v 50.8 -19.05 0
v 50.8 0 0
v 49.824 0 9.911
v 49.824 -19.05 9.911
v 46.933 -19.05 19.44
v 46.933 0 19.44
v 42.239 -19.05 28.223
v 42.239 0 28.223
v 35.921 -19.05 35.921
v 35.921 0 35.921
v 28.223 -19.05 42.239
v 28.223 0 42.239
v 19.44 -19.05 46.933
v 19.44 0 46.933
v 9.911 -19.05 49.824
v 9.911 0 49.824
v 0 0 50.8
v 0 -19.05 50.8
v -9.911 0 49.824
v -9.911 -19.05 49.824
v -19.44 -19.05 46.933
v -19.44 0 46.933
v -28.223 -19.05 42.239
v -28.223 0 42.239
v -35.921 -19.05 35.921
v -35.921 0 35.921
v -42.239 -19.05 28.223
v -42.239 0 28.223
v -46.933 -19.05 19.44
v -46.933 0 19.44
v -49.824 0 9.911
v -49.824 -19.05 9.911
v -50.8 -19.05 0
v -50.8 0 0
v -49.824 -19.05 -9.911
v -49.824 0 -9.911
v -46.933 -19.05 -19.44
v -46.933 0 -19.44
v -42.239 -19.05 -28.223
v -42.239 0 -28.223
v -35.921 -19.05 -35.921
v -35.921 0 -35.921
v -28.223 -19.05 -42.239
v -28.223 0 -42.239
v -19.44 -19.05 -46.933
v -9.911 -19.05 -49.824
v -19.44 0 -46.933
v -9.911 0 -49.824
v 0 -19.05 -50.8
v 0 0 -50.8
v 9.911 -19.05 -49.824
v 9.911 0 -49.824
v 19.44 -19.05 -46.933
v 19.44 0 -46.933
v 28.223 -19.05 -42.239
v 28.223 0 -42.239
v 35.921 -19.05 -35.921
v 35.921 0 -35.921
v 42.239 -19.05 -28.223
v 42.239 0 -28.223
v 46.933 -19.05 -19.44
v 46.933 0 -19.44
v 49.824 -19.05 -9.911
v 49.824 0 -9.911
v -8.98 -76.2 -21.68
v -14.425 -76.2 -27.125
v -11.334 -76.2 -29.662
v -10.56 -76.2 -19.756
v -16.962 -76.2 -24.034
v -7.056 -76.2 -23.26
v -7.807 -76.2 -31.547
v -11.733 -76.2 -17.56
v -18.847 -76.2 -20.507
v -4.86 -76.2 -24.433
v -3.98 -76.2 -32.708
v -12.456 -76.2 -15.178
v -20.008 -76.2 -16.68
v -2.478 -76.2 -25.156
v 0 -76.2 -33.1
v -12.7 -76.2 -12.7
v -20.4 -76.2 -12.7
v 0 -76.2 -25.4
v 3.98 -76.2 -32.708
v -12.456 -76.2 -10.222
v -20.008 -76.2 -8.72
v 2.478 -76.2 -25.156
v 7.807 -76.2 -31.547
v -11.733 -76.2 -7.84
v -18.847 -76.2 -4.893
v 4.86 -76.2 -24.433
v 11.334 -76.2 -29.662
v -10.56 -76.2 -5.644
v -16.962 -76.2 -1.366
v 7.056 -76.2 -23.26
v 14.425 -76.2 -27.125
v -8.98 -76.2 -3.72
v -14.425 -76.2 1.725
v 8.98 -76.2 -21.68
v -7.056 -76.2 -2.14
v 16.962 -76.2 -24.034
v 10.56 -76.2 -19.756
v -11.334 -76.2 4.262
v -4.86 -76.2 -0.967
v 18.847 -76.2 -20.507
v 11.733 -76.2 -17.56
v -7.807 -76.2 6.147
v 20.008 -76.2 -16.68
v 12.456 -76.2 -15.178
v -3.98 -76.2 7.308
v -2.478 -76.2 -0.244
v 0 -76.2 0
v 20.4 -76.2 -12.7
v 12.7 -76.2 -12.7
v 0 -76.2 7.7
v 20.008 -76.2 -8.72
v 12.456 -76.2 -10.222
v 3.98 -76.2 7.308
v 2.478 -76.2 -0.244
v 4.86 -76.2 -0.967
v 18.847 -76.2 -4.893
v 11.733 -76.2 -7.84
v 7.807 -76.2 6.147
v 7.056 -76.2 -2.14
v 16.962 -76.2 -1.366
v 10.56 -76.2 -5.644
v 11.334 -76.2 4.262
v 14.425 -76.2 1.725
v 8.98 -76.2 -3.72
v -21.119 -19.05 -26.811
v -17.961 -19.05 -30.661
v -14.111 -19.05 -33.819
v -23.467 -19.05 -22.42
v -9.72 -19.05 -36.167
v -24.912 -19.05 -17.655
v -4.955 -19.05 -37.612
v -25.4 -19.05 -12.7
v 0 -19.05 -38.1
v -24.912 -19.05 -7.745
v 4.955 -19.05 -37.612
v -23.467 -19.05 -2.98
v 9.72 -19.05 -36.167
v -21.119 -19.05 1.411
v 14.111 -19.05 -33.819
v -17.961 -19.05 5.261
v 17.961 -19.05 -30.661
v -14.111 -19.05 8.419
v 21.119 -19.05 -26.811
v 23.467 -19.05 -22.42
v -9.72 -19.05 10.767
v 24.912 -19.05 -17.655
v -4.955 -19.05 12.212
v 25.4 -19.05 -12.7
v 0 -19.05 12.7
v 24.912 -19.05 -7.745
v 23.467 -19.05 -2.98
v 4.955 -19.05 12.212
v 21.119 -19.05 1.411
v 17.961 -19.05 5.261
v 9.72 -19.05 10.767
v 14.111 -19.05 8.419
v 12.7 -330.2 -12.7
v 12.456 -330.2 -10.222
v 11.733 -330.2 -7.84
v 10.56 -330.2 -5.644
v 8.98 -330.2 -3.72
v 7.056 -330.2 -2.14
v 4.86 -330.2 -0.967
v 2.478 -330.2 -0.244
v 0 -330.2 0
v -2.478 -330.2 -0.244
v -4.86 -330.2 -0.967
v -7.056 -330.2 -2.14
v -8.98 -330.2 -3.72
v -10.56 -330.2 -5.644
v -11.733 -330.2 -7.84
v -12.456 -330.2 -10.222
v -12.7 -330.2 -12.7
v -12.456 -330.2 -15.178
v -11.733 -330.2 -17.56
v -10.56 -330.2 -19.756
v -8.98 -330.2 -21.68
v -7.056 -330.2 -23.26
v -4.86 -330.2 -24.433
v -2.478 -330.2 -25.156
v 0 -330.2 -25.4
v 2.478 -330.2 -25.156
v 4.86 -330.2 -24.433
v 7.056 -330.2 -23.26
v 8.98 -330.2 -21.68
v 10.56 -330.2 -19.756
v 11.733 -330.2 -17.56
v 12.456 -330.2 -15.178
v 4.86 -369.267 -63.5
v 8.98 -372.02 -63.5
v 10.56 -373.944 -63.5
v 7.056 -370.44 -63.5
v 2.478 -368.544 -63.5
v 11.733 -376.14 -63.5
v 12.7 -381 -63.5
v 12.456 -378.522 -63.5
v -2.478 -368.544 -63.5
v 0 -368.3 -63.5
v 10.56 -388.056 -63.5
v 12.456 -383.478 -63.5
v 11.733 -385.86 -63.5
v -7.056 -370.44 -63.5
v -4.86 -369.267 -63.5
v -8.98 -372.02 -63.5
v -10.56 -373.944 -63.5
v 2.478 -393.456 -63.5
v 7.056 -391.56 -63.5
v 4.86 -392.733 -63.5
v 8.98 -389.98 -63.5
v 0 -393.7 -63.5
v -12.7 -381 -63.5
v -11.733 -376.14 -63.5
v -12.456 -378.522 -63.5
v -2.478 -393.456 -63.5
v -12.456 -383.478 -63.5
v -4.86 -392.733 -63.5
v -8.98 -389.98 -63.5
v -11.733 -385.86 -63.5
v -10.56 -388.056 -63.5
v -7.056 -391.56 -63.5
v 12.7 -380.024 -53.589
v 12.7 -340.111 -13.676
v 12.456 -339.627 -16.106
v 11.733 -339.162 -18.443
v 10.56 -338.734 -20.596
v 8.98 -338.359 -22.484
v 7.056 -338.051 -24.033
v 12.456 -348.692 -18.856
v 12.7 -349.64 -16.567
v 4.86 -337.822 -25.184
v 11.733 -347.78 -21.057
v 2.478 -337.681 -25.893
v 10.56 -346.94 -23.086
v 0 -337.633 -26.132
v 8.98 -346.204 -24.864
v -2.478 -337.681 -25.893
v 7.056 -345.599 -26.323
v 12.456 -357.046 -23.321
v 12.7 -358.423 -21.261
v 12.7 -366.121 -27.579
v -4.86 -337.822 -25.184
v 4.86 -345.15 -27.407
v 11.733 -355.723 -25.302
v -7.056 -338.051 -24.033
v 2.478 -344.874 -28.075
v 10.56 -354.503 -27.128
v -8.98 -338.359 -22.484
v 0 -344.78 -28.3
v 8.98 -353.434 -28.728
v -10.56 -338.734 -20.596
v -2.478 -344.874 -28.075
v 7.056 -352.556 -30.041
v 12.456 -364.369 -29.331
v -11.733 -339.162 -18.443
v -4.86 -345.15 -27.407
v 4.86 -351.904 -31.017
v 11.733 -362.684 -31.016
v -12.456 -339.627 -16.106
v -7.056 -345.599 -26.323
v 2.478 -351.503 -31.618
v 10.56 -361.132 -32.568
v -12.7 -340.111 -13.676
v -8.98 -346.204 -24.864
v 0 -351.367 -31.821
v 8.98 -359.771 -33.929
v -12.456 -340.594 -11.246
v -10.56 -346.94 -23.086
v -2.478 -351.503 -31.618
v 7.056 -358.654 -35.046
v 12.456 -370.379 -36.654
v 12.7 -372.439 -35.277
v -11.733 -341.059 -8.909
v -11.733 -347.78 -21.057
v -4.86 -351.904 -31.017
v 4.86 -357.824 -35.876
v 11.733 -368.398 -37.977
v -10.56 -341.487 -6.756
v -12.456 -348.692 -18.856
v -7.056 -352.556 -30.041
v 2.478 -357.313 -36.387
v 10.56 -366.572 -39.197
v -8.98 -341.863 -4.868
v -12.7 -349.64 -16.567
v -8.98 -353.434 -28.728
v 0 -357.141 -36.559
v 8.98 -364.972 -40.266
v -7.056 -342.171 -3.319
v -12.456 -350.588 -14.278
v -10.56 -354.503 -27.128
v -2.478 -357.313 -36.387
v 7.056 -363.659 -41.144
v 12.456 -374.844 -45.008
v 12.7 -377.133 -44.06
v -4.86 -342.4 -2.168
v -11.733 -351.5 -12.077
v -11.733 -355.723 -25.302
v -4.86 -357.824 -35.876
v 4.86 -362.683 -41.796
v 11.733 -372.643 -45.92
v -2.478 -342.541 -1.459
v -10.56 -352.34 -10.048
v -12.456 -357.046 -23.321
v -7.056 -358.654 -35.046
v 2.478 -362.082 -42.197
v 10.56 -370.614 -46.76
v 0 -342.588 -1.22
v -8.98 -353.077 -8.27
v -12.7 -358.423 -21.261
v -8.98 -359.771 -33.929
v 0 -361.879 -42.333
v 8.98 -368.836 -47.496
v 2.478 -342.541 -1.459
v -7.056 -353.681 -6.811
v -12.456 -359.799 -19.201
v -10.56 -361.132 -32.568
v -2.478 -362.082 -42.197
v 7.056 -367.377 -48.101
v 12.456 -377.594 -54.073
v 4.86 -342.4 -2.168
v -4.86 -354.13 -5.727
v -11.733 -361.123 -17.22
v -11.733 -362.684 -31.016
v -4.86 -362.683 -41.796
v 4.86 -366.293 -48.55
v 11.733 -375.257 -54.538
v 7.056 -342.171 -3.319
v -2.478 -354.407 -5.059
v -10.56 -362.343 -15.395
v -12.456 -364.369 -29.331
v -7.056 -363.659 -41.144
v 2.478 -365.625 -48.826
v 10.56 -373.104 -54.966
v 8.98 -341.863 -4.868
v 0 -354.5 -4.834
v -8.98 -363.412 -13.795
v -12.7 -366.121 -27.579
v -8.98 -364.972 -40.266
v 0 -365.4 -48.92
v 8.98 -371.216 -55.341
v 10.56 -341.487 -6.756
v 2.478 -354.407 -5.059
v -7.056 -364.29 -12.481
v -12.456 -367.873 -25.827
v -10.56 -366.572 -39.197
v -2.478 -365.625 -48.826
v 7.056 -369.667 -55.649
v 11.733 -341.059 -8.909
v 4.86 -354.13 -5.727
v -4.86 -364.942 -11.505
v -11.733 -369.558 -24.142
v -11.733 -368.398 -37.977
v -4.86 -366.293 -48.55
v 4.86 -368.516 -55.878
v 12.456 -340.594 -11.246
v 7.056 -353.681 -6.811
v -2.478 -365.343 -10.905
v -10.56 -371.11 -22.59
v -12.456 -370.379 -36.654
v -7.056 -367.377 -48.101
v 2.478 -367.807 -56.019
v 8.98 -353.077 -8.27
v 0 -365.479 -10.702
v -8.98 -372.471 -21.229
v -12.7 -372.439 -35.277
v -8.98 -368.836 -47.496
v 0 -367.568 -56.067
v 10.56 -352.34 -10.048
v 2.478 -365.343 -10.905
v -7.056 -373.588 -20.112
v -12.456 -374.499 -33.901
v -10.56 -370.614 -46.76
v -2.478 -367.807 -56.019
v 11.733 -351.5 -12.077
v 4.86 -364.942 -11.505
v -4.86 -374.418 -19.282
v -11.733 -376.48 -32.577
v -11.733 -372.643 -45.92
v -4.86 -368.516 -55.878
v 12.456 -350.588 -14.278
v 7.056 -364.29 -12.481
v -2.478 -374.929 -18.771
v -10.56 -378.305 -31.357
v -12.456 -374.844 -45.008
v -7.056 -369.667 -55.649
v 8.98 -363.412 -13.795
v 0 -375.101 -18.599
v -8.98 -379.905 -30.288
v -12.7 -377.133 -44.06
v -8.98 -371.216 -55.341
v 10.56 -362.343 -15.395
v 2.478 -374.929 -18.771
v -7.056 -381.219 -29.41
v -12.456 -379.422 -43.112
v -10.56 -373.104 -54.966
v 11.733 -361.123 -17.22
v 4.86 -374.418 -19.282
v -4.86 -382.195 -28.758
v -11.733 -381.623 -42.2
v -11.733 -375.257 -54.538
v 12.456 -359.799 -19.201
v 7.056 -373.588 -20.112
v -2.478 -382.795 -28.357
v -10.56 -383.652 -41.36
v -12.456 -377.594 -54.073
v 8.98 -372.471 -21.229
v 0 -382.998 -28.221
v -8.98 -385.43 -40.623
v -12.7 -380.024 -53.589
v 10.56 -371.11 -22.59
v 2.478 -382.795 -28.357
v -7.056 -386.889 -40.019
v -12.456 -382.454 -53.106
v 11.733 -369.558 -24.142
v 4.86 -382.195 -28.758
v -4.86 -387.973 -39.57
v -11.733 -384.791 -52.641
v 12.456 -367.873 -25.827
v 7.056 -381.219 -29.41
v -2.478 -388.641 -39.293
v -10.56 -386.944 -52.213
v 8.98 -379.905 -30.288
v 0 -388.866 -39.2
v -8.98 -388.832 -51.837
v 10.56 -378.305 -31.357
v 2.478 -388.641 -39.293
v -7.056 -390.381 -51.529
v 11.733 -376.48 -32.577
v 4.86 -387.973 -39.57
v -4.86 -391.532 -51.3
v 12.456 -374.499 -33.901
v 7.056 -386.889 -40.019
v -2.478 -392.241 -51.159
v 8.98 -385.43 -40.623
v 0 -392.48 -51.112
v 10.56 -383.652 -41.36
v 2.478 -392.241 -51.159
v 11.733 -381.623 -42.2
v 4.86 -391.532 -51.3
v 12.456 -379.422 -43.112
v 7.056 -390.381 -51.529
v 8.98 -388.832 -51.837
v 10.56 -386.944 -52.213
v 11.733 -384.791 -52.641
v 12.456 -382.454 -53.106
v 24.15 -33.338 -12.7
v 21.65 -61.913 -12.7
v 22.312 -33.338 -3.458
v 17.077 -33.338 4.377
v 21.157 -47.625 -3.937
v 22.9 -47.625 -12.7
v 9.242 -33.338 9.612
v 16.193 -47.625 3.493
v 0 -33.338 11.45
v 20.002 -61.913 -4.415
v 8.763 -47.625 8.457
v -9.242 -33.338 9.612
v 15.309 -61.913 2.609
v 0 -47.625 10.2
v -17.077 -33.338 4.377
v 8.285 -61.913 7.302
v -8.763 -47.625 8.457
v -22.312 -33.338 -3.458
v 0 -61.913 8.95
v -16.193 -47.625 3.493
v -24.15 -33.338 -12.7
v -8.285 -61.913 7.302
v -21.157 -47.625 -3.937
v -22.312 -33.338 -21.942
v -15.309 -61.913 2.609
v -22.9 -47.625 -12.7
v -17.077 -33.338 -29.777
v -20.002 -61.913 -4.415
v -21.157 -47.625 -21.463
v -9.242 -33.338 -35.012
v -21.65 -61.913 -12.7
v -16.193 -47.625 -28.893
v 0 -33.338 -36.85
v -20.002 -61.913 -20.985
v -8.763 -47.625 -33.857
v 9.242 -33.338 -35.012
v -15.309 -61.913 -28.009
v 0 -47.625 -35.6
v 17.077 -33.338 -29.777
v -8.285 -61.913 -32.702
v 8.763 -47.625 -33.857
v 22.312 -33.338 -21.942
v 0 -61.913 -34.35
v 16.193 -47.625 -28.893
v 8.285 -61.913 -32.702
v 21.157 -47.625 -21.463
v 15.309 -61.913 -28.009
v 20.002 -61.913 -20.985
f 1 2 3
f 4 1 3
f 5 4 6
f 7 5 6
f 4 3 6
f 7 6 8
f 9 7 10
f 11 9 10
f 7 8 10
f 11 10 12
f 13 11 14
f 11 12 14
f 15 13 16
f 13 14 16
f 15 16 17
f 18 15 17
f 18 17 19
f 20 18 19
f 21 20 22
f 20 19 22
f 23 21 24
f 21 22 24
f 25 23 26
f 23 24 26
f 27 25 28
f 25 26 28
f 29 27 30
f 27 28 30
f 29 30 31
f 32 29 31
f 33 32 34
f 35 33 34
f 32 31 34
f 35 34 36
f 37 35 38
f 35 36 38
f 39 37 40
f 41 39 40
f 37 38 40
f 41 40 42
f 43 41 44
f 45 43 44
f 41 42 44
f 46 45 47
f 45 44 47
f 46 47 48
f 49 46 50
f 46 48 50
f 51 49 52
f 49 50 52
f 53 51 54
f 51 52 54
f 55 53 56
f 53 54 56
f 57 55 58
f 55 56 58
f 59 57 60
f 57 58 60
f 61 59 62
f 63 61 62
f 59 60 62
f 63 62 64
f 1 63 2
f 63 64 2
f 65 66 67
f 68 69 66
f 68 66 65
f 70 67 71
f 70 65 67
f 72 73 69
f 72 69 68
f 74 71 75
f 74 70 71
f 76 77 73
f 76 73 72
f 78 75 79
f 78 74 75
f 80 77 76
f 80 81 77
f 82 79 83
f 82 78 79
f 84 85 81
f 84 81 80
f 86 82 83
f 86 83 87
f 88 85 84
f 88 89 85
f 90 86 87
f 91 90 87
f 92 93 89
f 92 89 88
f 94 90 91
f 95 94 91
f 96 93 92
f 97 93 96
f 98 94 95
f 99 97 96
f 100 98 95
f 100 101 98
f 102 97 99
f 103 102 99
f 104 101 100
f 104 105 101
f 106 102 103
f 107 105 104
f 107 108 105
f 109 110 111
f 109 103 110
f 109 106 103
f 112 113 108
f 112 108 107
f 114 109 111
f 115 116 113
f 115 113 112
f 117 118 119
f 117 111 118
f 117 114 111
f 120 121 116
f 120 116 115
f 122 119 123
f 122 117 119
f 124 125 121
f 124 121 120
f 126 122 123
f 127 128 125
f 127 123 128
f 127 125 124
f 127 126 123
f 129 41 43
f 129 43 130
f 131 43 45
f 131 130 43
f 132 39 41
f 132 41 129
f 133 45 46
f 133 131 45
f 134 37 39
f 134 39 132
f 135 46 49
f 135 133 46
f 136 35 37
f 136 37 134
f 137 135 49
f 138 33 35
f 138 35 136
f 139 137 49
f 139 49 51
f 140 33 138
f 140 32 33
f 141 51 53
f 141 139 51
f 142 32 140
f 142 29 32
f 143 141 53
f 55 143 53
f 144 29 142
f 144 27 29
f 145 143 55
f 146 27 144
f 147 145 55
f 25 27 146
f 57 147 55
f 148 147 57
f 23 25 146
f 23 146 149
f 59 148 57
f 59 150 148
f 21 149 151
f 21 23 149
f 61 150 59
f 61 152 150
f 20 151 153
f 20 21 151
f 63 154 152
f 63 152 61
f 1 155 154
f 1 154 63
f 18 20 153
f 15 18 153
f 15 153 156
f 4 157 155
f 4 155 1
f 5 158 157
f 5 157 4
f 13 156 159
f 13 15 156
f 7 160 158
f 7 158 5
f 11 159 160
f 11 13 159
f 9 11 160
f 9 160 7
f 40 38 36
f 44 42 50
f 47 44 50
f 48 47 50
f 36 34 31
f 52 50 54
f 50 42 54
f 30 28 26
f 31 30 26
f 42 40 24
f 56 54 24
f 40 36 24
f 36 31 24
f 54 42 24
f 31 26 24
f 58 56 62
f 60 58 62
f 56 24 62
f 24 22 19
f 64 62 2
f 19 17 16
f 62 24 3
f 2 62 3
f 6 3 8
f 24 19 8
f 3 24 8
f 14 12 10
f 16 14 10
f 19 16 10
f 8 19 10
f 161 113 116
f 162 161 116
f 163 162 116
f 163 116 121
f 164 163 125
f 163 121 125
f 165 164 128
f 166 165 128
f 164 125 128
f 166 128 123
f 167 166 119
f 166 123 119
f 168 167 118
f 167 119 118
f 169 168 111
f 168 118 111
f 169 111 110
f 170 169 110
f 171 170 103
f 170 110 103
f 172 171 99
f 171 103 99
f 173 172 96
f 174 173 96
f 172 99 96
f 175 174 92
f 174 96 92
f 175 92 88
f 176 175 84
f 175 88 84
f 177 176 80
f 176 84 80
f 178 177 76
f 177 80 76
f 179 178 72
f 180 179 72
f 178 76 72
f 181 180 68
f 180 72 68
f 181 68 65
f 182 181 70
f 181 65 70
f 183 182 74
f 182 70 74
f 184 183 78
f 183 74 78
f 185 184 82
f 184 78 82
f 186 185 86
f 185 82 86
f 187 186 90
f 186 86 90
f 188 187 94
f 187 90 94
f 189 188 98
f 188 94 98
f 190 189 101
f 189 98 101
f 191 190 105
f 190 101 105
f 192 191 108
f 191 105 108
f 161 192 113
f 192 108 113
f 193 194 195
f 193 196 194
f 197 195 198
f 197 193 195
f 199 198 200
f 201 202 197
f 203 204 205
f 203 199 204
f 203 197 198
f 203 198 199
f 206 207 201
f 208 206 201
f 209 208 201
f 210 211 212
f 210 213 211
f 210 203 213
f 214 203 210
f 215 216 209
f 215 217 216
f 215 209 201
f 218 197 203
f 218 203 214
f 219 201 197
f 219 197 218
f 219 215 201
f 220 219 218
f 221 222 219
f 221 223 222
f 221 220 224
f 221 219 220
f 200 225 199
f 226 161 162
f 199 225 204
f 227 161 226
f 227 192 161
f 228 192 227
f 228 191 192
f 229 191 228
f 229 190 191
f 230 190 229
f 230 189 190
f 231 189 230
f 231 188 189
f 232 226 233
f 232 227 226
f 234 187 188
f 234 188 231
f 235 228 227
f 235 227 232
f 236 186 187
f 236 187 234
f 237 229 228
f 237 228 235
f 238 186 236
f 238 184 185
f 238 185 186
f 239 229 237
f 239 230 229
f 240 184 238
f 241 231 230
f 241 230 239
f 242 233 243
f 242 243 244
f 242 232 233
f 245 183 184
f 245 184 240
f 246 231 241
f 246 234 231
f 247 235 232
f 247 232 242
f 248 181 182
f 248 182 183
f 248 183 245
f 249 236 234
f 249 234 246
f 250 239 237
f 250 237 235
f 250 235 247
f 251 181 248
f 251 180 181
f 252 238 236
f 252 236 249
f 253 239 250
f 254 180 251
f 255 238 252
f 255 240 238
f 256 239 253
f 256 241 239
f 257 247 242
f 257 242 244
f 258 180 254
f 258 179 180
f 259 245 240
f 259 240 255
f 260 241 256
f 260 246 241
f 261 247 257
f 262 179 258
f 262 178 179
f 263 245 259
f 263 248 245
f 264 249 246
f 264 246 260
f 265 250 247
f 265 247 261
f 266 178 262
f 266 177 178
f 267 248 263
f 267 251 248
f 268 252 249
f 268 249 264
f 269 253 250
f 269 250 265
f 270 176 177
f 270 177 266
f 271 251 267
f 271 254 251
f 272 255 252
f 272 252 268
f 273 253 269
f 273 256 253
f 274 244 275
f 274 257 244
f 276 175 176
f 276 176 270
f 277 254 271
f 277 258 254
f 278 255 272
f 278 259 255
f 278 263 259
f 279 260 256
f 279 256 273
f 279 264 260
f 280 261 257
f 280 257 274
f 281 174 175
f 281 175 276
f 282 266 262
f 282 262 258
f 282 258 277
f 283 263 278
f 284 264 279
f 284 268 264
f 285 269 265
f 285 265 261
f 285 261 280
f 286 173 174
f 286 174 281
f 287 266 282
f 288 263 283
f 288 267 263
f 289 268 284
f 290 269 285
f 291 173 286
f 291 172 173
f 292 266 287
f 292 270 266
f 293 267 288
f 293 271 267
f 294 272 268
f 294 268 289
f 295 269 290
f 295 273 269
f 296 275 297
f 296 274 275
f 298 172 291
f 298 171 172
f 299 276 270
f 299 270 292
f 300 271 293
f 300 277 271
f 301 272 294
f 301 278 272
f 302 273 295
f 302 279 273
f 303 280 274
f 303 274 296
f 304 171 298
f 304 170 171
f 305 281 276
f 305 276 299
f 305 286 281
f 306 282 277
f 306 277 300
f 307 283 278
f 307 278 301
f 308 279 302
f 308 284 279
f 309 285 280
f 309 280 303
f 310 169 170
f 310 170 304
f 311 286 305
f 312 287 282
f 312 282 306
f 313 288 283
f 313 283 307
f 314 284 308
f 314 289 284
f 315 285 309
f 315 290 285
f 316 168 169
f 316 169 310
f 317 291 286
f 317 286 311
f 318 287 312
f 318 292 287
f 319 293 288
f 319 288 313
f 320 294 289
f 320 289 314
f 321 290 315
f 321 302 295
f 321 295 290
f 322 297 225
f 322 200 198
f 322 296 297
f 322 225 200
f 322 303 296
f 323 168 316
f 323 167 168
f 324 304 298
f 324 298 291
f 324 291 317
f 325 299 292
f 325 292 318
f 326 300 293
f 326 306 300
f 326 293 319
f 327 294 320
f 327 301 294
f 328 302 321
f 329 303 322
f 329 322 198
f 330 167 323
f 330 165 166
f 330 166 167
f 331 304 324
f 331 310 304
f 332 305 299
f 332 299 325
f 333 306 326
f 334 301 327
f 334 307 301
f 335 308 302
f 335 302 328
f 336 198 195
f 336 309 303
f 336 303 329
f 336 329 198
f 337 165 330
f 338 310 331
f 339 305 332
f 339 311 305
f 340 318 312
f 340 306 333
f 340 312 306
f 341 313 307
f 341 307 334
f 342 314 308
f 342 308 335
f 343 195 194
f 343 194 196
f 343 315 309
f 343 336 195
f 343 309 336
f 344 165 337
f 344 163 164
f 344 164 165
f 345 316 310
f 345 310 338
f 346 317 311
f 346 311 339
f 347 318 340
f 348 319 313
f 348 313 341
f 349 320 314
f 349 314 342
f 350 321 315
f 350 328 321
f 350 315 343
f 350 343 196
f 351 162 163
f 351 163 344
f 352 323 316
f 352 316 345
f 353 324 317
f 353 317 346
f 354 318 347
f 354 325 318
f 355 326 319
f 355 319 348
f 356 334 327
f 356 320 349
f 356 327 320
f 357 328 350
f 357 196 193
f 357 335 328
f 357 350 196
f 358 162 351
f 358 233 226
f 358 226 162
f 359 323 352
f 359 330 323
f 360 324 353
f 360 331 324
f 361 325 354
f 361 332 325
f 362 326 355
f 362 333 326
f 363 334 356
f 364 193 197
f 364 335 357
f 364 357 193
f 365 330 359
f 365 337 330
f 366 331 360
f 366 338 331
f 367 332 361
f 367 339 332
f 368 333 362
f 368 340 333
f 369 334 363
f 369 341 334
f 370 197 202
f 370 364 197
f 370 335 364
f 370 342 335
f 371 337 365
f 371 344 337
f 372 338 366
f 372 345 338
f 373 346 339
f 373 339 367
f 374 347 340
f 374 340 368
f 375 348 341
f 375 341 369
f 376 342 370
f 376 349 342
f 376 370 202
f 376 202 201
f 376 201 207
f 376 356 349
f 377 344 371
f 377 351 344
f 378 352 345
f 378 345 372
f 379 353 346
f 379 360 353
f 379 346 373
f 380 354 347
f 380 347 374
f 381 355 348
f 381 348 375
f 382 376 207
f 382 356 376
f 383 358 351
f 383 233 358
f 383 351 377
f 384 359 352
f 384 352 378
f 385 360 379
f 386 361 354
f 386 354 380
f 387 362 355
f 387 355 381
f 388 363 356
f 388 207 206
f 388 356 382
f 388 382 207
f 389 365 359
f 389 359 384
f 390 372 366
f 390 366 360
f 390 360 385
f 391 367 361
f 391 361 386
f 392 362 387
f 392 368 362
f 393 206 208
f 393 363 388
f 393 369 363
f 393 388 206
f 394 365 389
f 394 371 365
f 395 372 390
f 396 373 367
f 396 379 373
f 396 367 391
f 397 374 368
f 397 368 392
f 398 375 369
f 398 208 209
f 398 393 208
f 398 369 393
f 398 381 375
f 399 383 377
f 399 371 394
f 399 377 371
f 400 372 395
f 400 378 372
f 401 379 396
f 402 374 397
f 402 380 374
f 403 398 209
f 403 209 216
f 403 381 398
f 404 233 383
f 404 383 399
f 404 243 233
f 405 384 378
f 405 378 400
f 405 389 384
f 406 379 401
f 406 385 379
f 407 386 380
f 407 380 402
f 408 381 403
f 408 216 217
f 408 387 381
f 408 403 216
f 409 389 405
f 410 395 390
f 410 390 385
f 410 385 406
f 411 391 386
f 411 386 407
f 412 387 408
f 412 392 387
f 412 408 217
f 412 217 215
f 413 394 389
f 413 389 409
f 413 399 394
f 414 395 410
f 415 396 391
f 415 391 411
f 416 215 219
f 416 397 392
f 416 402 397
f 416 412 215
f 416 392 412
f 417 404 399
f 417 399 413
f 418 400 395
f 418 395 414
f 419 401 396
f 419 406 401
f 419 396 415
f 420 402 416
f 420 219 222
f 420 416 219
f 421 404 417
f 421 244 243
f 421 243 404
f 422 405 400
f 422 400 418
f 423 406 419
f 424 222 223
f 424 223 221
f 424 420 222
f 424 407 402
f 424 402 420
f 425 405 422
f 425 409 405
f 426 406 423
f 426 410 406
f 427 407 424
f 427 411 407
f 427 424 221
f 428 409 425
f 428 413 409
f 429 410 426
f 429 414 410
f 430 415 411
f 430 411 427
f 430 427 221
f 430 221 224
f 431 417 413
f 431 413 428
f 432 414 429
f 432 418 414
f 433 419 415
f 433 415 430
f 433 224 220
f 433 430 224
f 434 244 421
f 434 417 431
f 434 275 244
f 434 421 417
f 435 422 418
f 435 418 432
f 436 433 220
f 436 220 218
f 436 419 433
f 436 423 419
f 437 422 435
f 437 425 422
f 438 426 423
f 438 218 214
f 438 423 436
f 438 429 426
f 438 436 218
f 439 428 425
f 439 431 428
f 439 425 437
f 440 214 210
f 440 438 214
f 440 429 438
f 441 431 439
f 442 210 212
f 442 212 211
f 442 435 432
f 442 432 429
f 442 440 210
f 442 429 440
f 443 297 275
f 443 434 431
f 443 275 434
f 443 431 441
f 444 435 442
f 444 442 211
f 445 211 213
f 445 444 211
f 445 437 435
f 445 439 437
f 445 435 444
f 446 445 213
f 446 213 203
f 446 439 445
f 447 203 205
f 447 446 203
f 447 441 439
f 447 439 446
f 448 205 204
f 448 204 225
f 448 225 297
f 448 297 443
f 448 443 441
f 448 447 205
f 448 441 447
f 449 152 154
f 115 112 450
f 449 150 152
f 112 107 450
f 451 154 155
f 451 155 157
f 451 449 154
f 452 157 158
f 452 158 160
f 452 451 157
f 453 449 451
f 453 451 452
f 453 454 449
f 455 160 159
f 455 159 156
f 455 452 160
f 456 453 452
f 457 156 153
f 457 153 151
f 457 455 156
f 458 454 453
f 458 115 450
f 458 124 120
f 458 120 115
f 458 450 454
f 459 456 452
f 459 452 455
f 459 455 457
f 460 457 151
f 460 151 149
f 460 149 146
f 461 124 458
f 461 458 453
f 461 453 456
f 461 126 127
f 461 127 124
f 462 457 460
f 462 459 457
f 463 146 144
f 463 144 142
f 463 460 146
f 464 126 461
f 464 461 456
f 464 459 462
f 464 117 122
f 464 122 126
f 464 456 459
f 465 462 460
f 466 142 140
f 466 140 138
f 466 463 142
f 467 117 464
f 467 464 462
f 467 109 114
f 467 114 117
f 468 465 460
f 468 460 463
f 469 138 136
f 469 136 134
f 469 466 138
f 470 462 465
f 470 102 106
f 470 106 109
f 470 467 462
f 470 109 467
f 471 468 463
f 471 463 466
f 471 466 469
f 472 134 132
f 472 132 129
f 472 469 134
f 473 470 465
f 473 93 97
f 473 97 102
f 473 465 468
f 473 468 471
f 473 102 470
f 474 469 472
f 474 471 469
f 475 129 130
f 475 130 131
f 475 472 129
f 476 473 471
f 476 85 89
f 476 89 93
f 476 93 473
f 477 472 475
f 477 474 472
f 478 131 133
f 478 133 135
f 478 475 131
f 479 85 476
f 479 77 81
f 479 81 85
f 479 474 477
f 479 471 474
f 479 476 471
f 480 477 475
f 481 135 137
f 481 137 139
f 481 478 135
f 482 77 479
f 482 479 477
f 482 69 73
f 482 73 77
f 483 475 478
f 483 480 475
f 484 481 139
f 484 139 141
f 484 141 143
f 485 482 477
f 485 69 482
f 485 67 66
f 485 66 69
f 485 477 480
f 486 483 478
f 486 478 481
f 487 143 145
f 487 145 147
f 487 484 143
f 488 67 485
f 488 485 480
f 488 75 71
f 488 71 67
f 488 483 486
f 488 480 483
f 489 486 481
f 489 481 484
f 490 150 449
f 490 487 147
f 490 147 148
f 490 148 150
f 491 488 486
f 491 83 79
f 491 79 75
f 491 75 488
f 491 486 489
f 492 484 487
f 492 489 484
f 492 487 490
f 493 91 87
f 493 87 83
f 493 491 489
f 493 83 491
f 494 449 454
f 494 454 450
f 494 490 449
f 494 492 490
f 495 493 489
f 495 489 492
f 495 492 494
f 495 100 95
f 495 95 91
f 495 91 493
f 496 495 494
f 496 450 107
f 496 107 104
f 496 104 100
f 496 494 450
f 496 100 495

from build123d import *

# Parameters (mm, degrees)
F0_R     = 50.8
F1_DEPTH = 19.05
F2_R     = 25.4
F3_DEPTH = 57.15
F3_TAPER = 5
F4_R     = 12.7
F5_DEPTH = 254
F6_R     = 12.7


# Not quite as in the source:
# - the program builds the solid bodies; features that only make, move or delete a surface that nothing else refers to are left out


with BuildPart() as f1:
    # F0 (on Front) → F1 (new body)
    with BuildSketch(Plane.XZ):
        Circle(F0_R)
    extrude(amount=F1_DEPTH)

    # F2 (on face) → F3 (join)
    with BuildSketch(Plane.XZ.offset(19.05)):
        with Locations((0, -12.7)):
            Circle(F2_R)
    extrude(amount=F3_DEPTH, taper=F3_TAPER)

    # F4 (on face) → F5 (join)
    with BuildSketch(Plane.XZ.offset(76.2)):
        with Locations((0, -12.7)):
            Circle(F4_R)
    extrude(amount=F5_DEPTH)

    # F8: sweep along a path in F7
    with BuildLine(Plane.YZ) as f8_path:
        ThreePointArc((-330.2, -12.7), (-366.1210244843, -27.5789755157), (-381, -63.5))
    # F6 (on face) → F8 (sweep)
    with BuildSketch(Plane.XZ.offset(330.2)):
        with Locations((0, -12.7)):
            Circle(F6_R)
    sweep(path=f8_path.line)


solid = f1.part
